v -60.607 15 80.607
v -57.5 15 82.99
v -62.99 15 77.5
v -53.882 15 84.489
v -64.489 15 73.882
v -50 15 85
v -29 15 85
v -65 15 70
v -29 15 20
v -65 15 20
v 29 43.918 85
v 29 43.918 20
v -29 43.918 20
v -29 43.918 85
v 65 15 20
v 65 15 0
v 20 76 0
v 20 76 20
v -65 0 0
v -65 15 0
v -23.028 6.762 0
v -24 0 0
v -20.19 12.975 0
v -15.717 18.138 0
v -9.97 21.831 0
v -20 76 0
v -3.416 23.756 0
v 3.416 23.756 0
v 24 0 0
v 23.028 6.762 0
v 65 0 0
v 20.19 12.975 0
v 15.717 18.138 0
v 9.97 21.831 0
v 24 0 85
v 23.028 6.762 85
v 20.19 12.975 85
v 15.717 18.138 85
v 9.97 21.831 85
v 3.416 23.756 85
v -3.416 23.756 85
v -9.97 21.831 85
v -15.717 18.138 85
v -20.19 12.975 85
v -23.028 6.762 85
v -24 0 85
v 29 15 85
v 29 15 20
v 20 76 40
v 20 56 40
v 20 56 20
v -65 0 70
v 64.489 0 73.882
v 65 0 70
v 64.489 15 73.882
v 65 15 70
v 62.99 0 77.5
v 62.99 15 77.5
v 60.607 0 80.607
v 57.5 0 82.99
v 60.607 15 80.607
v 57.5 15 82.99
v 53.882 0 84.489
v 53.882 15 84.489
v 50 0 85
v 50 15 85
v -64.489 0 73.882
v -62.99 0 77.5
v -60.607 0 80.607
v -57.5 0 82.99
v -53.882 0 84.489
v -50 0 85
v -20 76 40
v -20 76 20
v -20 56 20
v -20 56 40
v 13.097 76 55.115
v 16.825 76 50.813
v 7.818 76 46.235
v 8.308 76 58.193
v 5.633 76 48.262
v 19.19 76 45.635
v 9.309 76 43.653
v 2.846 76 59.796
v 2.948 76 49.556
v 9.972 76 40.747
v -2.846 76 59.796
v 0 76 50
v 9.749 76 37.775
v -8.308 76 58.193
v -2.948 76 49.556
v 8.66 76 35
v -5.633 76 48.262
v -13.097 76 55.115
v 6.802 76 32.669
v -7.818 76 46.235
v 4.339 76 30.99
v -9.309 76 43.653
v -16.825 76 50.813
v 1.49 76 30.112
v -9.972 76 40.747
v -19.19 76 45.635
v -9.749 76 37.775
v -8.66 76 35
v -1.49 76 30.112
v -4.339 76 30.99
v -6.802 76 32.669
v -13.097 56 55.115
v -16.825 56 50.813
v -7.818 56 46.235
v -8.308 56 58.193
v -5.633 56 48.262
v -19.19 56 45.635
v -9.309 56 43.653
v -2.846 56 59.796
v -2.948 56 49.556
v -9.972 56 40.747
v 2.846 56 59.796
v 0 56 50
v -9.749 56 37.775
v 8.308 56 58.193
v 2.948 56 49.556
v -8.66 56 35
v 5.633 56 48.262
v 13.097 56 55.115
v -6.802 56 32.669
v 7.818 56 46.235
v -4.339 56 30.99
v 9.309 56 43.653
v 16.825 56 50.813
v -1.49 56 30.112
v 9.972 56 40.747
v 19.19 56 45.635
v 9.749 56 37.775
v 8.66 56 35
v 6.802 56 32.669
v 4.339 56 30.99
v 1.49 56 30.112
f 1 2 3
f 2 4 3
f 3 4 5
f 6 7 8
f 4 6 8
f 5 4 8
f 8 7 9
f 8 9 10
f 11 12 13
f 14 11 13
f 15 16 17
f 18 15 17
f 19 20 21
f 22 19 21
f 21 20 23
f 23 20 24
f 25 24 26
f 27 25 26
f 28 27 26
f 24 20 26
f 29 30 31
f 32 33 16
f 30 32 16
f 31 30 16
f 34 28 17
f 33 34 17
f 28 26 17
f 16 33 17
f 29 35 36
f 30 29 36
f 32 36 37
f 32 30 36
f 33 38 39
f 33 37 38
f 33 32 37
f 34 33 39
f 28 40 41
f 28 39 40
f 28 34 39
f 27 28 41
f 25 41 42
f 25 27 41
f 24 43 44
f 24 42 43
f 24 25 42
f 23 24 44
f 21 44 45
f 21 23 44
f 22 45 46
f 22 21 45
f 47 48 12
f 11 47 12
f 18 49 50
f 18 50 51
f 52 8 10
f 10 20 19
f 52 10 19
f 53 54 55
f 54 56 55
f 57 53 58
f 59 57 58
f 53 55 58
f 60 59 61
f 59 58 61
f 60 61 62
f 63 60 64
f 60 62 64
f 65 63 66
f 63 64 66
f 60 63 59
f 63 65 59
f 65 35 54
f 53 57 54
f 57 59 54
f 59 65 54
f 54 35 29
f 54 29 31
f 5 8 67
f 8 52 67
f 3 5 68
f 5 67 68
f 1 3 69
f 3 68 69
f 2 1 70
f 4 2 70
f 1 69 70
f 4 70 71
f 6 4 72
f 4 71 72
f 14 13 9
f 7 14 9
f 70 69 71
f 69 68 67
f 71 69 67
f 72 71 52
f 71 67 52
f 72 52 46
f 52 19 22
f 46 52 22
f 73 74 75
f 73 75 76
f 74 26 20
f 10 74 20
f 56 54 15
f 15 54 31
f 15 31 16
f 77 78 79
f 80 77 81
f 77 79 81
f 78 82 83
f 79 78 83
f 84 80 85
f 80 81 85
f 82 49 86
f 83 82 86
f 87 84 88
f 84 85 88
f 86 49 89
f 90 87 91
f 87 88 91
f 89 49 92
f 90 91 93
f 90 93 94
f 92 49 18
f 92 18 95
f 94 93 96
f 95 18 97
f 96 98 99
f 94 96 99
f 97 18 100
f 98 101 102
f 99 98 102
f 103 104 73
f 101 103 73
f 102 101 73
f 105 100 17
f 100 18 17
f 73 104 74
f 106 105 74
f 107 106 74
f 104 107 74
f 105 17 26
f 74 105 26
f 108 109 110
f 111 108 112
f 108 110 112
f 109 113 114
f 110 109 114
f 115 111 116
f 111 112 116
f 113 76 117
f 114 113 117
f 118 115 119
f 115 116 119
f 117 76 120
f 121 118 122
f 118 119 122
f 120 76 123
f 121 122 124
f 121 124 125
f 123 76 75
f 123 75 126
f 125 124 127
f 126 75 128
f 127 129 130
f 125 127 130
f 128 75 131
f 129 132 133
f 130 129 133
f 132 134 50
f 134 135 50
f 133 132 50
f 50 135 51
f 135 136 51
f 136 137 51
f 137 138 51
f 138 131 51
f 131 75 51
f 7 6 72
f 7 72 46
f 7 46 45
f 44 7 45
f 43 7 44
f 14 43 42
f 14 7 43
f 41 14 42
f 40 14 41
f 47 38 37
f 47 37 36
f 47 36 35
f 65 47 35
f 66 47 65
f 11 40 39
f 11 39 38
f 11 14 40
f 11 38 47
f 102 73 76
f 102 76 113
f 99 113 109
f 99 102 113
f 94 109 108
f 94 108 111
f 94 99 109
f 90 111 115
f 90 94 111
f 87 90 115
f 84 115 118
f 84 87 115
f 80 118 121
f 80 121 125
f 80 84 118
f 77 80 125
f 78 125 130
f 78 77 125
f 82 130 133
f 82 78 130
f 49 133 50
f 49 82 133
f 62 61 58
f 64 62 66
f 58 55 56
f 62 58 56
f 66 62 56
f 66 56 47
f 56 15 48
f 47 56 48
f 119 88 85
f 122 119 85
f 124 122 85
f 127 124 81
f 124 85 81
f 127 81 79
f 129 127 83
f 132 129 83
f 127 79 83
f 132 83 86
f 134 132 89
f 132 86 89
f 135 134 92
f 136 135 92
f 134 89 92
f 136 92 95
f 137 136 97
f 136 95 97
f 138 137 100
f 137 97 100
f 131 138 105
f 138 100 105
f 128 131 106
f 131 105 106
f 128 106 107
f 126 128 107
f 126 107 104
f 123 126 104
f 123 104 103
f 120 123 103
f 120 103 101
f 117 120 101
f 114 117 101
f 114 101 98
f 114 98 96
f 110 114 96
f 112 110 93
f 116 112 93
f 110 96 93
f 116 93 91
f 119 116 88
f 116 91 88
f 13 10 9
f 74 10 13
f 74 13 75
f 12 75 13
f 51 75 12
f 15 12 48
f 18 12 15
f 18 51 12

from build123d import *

# Parameters (mm, degrees)
EXTRUDE_1_DEPTH          = 85
CUT_EXTRUDE_1_DEPTH      = 116.666660236
CUT_EXTRUDE_1_DEPTH_BACK = 116.666660236
EXTRUDE_2_DEPTH          = 20
SKETCH_5_R               = 10
EXTRUDE_3_DEPTH          = 20
FILLET_1_R               = 15


with BuildPart() as part:
    # 스케치1 → 보스-돌출1 (new body)
    with BuildSketch(Plane.XY):
        Polygon((-65, 0), (65, 0), (65, 15), (29, 15), (29, 43.917835671), (-29, 43.917835671), (-29, 15), (-65, 15), align=None)
    extrude(amount=EXTRUDE_1_DEPTH)

    # 스케치2 → 컷-돌출1 (cut, two sides: drawn at the far end of the back side and taken through both)
    with BuildSketch(Plane.XY.offset(85).offset(-CUT_EXTRUDE_1_DEPTH_BACK)):
        with BuildLine():
            ThreePointArc((24, 0), (0, 24), (-24, 0))
            Line((-24, 0), (24, 0))
        make_face()
    extrude(amount=CUT_EXTRUDE_1_DEPTH + CUT_EXTRUDE_1_DEPTH_BACK, mode=Mode.SUBTRACT)

    # 스케치4 → 보스-돌출2 (add)
    with BuildSketch(Plane(origin=(0, 0, 0), x_dir=(-1, 0, 0), z_dir=(0, 0, -1))):
        Polygon((-65, 15), (-20, 76), (20, 76), (65, 15), (29, 15), (29, 43.917835671), (-29, 43.917835671), (-29, 15), align=None)
    extrude(amount=-EXTRUDE_2_DEPTH)

    # 스케치5 → 보스-돌출3 (add)
    with BuildSketch(Plane(origin=(0, 76, 0), x_dir=(1, 0, 0), z_dir=(0, 1, 0))):
        with BuildLine():
            Line((-20, 0), (-20, -40))
            ThreePointArc((-20, -40), (0, -60), (20, -40))
            Line((20, -40), (20, 0))
            Line((20, 0), (-20, 0))
        make_face()
        with Locations(Location((0, -40, 0), (0, 0, 270))):
            Circle(SKETCH_5_R, mode=Mode.SUBTRACT)
    extrude(amount=-EXTRUDE_3_DEPTH)

    # 필렛1
    fillet_1_edges = [part.edges().sort_by_distance(p)[0] for p in [
        (65, 7.5, 85),
        (-65, 7.5, 85),
    ]]
    fillet(fillet_1_edges, radius=FILLET_1_R)


solid = part.part
